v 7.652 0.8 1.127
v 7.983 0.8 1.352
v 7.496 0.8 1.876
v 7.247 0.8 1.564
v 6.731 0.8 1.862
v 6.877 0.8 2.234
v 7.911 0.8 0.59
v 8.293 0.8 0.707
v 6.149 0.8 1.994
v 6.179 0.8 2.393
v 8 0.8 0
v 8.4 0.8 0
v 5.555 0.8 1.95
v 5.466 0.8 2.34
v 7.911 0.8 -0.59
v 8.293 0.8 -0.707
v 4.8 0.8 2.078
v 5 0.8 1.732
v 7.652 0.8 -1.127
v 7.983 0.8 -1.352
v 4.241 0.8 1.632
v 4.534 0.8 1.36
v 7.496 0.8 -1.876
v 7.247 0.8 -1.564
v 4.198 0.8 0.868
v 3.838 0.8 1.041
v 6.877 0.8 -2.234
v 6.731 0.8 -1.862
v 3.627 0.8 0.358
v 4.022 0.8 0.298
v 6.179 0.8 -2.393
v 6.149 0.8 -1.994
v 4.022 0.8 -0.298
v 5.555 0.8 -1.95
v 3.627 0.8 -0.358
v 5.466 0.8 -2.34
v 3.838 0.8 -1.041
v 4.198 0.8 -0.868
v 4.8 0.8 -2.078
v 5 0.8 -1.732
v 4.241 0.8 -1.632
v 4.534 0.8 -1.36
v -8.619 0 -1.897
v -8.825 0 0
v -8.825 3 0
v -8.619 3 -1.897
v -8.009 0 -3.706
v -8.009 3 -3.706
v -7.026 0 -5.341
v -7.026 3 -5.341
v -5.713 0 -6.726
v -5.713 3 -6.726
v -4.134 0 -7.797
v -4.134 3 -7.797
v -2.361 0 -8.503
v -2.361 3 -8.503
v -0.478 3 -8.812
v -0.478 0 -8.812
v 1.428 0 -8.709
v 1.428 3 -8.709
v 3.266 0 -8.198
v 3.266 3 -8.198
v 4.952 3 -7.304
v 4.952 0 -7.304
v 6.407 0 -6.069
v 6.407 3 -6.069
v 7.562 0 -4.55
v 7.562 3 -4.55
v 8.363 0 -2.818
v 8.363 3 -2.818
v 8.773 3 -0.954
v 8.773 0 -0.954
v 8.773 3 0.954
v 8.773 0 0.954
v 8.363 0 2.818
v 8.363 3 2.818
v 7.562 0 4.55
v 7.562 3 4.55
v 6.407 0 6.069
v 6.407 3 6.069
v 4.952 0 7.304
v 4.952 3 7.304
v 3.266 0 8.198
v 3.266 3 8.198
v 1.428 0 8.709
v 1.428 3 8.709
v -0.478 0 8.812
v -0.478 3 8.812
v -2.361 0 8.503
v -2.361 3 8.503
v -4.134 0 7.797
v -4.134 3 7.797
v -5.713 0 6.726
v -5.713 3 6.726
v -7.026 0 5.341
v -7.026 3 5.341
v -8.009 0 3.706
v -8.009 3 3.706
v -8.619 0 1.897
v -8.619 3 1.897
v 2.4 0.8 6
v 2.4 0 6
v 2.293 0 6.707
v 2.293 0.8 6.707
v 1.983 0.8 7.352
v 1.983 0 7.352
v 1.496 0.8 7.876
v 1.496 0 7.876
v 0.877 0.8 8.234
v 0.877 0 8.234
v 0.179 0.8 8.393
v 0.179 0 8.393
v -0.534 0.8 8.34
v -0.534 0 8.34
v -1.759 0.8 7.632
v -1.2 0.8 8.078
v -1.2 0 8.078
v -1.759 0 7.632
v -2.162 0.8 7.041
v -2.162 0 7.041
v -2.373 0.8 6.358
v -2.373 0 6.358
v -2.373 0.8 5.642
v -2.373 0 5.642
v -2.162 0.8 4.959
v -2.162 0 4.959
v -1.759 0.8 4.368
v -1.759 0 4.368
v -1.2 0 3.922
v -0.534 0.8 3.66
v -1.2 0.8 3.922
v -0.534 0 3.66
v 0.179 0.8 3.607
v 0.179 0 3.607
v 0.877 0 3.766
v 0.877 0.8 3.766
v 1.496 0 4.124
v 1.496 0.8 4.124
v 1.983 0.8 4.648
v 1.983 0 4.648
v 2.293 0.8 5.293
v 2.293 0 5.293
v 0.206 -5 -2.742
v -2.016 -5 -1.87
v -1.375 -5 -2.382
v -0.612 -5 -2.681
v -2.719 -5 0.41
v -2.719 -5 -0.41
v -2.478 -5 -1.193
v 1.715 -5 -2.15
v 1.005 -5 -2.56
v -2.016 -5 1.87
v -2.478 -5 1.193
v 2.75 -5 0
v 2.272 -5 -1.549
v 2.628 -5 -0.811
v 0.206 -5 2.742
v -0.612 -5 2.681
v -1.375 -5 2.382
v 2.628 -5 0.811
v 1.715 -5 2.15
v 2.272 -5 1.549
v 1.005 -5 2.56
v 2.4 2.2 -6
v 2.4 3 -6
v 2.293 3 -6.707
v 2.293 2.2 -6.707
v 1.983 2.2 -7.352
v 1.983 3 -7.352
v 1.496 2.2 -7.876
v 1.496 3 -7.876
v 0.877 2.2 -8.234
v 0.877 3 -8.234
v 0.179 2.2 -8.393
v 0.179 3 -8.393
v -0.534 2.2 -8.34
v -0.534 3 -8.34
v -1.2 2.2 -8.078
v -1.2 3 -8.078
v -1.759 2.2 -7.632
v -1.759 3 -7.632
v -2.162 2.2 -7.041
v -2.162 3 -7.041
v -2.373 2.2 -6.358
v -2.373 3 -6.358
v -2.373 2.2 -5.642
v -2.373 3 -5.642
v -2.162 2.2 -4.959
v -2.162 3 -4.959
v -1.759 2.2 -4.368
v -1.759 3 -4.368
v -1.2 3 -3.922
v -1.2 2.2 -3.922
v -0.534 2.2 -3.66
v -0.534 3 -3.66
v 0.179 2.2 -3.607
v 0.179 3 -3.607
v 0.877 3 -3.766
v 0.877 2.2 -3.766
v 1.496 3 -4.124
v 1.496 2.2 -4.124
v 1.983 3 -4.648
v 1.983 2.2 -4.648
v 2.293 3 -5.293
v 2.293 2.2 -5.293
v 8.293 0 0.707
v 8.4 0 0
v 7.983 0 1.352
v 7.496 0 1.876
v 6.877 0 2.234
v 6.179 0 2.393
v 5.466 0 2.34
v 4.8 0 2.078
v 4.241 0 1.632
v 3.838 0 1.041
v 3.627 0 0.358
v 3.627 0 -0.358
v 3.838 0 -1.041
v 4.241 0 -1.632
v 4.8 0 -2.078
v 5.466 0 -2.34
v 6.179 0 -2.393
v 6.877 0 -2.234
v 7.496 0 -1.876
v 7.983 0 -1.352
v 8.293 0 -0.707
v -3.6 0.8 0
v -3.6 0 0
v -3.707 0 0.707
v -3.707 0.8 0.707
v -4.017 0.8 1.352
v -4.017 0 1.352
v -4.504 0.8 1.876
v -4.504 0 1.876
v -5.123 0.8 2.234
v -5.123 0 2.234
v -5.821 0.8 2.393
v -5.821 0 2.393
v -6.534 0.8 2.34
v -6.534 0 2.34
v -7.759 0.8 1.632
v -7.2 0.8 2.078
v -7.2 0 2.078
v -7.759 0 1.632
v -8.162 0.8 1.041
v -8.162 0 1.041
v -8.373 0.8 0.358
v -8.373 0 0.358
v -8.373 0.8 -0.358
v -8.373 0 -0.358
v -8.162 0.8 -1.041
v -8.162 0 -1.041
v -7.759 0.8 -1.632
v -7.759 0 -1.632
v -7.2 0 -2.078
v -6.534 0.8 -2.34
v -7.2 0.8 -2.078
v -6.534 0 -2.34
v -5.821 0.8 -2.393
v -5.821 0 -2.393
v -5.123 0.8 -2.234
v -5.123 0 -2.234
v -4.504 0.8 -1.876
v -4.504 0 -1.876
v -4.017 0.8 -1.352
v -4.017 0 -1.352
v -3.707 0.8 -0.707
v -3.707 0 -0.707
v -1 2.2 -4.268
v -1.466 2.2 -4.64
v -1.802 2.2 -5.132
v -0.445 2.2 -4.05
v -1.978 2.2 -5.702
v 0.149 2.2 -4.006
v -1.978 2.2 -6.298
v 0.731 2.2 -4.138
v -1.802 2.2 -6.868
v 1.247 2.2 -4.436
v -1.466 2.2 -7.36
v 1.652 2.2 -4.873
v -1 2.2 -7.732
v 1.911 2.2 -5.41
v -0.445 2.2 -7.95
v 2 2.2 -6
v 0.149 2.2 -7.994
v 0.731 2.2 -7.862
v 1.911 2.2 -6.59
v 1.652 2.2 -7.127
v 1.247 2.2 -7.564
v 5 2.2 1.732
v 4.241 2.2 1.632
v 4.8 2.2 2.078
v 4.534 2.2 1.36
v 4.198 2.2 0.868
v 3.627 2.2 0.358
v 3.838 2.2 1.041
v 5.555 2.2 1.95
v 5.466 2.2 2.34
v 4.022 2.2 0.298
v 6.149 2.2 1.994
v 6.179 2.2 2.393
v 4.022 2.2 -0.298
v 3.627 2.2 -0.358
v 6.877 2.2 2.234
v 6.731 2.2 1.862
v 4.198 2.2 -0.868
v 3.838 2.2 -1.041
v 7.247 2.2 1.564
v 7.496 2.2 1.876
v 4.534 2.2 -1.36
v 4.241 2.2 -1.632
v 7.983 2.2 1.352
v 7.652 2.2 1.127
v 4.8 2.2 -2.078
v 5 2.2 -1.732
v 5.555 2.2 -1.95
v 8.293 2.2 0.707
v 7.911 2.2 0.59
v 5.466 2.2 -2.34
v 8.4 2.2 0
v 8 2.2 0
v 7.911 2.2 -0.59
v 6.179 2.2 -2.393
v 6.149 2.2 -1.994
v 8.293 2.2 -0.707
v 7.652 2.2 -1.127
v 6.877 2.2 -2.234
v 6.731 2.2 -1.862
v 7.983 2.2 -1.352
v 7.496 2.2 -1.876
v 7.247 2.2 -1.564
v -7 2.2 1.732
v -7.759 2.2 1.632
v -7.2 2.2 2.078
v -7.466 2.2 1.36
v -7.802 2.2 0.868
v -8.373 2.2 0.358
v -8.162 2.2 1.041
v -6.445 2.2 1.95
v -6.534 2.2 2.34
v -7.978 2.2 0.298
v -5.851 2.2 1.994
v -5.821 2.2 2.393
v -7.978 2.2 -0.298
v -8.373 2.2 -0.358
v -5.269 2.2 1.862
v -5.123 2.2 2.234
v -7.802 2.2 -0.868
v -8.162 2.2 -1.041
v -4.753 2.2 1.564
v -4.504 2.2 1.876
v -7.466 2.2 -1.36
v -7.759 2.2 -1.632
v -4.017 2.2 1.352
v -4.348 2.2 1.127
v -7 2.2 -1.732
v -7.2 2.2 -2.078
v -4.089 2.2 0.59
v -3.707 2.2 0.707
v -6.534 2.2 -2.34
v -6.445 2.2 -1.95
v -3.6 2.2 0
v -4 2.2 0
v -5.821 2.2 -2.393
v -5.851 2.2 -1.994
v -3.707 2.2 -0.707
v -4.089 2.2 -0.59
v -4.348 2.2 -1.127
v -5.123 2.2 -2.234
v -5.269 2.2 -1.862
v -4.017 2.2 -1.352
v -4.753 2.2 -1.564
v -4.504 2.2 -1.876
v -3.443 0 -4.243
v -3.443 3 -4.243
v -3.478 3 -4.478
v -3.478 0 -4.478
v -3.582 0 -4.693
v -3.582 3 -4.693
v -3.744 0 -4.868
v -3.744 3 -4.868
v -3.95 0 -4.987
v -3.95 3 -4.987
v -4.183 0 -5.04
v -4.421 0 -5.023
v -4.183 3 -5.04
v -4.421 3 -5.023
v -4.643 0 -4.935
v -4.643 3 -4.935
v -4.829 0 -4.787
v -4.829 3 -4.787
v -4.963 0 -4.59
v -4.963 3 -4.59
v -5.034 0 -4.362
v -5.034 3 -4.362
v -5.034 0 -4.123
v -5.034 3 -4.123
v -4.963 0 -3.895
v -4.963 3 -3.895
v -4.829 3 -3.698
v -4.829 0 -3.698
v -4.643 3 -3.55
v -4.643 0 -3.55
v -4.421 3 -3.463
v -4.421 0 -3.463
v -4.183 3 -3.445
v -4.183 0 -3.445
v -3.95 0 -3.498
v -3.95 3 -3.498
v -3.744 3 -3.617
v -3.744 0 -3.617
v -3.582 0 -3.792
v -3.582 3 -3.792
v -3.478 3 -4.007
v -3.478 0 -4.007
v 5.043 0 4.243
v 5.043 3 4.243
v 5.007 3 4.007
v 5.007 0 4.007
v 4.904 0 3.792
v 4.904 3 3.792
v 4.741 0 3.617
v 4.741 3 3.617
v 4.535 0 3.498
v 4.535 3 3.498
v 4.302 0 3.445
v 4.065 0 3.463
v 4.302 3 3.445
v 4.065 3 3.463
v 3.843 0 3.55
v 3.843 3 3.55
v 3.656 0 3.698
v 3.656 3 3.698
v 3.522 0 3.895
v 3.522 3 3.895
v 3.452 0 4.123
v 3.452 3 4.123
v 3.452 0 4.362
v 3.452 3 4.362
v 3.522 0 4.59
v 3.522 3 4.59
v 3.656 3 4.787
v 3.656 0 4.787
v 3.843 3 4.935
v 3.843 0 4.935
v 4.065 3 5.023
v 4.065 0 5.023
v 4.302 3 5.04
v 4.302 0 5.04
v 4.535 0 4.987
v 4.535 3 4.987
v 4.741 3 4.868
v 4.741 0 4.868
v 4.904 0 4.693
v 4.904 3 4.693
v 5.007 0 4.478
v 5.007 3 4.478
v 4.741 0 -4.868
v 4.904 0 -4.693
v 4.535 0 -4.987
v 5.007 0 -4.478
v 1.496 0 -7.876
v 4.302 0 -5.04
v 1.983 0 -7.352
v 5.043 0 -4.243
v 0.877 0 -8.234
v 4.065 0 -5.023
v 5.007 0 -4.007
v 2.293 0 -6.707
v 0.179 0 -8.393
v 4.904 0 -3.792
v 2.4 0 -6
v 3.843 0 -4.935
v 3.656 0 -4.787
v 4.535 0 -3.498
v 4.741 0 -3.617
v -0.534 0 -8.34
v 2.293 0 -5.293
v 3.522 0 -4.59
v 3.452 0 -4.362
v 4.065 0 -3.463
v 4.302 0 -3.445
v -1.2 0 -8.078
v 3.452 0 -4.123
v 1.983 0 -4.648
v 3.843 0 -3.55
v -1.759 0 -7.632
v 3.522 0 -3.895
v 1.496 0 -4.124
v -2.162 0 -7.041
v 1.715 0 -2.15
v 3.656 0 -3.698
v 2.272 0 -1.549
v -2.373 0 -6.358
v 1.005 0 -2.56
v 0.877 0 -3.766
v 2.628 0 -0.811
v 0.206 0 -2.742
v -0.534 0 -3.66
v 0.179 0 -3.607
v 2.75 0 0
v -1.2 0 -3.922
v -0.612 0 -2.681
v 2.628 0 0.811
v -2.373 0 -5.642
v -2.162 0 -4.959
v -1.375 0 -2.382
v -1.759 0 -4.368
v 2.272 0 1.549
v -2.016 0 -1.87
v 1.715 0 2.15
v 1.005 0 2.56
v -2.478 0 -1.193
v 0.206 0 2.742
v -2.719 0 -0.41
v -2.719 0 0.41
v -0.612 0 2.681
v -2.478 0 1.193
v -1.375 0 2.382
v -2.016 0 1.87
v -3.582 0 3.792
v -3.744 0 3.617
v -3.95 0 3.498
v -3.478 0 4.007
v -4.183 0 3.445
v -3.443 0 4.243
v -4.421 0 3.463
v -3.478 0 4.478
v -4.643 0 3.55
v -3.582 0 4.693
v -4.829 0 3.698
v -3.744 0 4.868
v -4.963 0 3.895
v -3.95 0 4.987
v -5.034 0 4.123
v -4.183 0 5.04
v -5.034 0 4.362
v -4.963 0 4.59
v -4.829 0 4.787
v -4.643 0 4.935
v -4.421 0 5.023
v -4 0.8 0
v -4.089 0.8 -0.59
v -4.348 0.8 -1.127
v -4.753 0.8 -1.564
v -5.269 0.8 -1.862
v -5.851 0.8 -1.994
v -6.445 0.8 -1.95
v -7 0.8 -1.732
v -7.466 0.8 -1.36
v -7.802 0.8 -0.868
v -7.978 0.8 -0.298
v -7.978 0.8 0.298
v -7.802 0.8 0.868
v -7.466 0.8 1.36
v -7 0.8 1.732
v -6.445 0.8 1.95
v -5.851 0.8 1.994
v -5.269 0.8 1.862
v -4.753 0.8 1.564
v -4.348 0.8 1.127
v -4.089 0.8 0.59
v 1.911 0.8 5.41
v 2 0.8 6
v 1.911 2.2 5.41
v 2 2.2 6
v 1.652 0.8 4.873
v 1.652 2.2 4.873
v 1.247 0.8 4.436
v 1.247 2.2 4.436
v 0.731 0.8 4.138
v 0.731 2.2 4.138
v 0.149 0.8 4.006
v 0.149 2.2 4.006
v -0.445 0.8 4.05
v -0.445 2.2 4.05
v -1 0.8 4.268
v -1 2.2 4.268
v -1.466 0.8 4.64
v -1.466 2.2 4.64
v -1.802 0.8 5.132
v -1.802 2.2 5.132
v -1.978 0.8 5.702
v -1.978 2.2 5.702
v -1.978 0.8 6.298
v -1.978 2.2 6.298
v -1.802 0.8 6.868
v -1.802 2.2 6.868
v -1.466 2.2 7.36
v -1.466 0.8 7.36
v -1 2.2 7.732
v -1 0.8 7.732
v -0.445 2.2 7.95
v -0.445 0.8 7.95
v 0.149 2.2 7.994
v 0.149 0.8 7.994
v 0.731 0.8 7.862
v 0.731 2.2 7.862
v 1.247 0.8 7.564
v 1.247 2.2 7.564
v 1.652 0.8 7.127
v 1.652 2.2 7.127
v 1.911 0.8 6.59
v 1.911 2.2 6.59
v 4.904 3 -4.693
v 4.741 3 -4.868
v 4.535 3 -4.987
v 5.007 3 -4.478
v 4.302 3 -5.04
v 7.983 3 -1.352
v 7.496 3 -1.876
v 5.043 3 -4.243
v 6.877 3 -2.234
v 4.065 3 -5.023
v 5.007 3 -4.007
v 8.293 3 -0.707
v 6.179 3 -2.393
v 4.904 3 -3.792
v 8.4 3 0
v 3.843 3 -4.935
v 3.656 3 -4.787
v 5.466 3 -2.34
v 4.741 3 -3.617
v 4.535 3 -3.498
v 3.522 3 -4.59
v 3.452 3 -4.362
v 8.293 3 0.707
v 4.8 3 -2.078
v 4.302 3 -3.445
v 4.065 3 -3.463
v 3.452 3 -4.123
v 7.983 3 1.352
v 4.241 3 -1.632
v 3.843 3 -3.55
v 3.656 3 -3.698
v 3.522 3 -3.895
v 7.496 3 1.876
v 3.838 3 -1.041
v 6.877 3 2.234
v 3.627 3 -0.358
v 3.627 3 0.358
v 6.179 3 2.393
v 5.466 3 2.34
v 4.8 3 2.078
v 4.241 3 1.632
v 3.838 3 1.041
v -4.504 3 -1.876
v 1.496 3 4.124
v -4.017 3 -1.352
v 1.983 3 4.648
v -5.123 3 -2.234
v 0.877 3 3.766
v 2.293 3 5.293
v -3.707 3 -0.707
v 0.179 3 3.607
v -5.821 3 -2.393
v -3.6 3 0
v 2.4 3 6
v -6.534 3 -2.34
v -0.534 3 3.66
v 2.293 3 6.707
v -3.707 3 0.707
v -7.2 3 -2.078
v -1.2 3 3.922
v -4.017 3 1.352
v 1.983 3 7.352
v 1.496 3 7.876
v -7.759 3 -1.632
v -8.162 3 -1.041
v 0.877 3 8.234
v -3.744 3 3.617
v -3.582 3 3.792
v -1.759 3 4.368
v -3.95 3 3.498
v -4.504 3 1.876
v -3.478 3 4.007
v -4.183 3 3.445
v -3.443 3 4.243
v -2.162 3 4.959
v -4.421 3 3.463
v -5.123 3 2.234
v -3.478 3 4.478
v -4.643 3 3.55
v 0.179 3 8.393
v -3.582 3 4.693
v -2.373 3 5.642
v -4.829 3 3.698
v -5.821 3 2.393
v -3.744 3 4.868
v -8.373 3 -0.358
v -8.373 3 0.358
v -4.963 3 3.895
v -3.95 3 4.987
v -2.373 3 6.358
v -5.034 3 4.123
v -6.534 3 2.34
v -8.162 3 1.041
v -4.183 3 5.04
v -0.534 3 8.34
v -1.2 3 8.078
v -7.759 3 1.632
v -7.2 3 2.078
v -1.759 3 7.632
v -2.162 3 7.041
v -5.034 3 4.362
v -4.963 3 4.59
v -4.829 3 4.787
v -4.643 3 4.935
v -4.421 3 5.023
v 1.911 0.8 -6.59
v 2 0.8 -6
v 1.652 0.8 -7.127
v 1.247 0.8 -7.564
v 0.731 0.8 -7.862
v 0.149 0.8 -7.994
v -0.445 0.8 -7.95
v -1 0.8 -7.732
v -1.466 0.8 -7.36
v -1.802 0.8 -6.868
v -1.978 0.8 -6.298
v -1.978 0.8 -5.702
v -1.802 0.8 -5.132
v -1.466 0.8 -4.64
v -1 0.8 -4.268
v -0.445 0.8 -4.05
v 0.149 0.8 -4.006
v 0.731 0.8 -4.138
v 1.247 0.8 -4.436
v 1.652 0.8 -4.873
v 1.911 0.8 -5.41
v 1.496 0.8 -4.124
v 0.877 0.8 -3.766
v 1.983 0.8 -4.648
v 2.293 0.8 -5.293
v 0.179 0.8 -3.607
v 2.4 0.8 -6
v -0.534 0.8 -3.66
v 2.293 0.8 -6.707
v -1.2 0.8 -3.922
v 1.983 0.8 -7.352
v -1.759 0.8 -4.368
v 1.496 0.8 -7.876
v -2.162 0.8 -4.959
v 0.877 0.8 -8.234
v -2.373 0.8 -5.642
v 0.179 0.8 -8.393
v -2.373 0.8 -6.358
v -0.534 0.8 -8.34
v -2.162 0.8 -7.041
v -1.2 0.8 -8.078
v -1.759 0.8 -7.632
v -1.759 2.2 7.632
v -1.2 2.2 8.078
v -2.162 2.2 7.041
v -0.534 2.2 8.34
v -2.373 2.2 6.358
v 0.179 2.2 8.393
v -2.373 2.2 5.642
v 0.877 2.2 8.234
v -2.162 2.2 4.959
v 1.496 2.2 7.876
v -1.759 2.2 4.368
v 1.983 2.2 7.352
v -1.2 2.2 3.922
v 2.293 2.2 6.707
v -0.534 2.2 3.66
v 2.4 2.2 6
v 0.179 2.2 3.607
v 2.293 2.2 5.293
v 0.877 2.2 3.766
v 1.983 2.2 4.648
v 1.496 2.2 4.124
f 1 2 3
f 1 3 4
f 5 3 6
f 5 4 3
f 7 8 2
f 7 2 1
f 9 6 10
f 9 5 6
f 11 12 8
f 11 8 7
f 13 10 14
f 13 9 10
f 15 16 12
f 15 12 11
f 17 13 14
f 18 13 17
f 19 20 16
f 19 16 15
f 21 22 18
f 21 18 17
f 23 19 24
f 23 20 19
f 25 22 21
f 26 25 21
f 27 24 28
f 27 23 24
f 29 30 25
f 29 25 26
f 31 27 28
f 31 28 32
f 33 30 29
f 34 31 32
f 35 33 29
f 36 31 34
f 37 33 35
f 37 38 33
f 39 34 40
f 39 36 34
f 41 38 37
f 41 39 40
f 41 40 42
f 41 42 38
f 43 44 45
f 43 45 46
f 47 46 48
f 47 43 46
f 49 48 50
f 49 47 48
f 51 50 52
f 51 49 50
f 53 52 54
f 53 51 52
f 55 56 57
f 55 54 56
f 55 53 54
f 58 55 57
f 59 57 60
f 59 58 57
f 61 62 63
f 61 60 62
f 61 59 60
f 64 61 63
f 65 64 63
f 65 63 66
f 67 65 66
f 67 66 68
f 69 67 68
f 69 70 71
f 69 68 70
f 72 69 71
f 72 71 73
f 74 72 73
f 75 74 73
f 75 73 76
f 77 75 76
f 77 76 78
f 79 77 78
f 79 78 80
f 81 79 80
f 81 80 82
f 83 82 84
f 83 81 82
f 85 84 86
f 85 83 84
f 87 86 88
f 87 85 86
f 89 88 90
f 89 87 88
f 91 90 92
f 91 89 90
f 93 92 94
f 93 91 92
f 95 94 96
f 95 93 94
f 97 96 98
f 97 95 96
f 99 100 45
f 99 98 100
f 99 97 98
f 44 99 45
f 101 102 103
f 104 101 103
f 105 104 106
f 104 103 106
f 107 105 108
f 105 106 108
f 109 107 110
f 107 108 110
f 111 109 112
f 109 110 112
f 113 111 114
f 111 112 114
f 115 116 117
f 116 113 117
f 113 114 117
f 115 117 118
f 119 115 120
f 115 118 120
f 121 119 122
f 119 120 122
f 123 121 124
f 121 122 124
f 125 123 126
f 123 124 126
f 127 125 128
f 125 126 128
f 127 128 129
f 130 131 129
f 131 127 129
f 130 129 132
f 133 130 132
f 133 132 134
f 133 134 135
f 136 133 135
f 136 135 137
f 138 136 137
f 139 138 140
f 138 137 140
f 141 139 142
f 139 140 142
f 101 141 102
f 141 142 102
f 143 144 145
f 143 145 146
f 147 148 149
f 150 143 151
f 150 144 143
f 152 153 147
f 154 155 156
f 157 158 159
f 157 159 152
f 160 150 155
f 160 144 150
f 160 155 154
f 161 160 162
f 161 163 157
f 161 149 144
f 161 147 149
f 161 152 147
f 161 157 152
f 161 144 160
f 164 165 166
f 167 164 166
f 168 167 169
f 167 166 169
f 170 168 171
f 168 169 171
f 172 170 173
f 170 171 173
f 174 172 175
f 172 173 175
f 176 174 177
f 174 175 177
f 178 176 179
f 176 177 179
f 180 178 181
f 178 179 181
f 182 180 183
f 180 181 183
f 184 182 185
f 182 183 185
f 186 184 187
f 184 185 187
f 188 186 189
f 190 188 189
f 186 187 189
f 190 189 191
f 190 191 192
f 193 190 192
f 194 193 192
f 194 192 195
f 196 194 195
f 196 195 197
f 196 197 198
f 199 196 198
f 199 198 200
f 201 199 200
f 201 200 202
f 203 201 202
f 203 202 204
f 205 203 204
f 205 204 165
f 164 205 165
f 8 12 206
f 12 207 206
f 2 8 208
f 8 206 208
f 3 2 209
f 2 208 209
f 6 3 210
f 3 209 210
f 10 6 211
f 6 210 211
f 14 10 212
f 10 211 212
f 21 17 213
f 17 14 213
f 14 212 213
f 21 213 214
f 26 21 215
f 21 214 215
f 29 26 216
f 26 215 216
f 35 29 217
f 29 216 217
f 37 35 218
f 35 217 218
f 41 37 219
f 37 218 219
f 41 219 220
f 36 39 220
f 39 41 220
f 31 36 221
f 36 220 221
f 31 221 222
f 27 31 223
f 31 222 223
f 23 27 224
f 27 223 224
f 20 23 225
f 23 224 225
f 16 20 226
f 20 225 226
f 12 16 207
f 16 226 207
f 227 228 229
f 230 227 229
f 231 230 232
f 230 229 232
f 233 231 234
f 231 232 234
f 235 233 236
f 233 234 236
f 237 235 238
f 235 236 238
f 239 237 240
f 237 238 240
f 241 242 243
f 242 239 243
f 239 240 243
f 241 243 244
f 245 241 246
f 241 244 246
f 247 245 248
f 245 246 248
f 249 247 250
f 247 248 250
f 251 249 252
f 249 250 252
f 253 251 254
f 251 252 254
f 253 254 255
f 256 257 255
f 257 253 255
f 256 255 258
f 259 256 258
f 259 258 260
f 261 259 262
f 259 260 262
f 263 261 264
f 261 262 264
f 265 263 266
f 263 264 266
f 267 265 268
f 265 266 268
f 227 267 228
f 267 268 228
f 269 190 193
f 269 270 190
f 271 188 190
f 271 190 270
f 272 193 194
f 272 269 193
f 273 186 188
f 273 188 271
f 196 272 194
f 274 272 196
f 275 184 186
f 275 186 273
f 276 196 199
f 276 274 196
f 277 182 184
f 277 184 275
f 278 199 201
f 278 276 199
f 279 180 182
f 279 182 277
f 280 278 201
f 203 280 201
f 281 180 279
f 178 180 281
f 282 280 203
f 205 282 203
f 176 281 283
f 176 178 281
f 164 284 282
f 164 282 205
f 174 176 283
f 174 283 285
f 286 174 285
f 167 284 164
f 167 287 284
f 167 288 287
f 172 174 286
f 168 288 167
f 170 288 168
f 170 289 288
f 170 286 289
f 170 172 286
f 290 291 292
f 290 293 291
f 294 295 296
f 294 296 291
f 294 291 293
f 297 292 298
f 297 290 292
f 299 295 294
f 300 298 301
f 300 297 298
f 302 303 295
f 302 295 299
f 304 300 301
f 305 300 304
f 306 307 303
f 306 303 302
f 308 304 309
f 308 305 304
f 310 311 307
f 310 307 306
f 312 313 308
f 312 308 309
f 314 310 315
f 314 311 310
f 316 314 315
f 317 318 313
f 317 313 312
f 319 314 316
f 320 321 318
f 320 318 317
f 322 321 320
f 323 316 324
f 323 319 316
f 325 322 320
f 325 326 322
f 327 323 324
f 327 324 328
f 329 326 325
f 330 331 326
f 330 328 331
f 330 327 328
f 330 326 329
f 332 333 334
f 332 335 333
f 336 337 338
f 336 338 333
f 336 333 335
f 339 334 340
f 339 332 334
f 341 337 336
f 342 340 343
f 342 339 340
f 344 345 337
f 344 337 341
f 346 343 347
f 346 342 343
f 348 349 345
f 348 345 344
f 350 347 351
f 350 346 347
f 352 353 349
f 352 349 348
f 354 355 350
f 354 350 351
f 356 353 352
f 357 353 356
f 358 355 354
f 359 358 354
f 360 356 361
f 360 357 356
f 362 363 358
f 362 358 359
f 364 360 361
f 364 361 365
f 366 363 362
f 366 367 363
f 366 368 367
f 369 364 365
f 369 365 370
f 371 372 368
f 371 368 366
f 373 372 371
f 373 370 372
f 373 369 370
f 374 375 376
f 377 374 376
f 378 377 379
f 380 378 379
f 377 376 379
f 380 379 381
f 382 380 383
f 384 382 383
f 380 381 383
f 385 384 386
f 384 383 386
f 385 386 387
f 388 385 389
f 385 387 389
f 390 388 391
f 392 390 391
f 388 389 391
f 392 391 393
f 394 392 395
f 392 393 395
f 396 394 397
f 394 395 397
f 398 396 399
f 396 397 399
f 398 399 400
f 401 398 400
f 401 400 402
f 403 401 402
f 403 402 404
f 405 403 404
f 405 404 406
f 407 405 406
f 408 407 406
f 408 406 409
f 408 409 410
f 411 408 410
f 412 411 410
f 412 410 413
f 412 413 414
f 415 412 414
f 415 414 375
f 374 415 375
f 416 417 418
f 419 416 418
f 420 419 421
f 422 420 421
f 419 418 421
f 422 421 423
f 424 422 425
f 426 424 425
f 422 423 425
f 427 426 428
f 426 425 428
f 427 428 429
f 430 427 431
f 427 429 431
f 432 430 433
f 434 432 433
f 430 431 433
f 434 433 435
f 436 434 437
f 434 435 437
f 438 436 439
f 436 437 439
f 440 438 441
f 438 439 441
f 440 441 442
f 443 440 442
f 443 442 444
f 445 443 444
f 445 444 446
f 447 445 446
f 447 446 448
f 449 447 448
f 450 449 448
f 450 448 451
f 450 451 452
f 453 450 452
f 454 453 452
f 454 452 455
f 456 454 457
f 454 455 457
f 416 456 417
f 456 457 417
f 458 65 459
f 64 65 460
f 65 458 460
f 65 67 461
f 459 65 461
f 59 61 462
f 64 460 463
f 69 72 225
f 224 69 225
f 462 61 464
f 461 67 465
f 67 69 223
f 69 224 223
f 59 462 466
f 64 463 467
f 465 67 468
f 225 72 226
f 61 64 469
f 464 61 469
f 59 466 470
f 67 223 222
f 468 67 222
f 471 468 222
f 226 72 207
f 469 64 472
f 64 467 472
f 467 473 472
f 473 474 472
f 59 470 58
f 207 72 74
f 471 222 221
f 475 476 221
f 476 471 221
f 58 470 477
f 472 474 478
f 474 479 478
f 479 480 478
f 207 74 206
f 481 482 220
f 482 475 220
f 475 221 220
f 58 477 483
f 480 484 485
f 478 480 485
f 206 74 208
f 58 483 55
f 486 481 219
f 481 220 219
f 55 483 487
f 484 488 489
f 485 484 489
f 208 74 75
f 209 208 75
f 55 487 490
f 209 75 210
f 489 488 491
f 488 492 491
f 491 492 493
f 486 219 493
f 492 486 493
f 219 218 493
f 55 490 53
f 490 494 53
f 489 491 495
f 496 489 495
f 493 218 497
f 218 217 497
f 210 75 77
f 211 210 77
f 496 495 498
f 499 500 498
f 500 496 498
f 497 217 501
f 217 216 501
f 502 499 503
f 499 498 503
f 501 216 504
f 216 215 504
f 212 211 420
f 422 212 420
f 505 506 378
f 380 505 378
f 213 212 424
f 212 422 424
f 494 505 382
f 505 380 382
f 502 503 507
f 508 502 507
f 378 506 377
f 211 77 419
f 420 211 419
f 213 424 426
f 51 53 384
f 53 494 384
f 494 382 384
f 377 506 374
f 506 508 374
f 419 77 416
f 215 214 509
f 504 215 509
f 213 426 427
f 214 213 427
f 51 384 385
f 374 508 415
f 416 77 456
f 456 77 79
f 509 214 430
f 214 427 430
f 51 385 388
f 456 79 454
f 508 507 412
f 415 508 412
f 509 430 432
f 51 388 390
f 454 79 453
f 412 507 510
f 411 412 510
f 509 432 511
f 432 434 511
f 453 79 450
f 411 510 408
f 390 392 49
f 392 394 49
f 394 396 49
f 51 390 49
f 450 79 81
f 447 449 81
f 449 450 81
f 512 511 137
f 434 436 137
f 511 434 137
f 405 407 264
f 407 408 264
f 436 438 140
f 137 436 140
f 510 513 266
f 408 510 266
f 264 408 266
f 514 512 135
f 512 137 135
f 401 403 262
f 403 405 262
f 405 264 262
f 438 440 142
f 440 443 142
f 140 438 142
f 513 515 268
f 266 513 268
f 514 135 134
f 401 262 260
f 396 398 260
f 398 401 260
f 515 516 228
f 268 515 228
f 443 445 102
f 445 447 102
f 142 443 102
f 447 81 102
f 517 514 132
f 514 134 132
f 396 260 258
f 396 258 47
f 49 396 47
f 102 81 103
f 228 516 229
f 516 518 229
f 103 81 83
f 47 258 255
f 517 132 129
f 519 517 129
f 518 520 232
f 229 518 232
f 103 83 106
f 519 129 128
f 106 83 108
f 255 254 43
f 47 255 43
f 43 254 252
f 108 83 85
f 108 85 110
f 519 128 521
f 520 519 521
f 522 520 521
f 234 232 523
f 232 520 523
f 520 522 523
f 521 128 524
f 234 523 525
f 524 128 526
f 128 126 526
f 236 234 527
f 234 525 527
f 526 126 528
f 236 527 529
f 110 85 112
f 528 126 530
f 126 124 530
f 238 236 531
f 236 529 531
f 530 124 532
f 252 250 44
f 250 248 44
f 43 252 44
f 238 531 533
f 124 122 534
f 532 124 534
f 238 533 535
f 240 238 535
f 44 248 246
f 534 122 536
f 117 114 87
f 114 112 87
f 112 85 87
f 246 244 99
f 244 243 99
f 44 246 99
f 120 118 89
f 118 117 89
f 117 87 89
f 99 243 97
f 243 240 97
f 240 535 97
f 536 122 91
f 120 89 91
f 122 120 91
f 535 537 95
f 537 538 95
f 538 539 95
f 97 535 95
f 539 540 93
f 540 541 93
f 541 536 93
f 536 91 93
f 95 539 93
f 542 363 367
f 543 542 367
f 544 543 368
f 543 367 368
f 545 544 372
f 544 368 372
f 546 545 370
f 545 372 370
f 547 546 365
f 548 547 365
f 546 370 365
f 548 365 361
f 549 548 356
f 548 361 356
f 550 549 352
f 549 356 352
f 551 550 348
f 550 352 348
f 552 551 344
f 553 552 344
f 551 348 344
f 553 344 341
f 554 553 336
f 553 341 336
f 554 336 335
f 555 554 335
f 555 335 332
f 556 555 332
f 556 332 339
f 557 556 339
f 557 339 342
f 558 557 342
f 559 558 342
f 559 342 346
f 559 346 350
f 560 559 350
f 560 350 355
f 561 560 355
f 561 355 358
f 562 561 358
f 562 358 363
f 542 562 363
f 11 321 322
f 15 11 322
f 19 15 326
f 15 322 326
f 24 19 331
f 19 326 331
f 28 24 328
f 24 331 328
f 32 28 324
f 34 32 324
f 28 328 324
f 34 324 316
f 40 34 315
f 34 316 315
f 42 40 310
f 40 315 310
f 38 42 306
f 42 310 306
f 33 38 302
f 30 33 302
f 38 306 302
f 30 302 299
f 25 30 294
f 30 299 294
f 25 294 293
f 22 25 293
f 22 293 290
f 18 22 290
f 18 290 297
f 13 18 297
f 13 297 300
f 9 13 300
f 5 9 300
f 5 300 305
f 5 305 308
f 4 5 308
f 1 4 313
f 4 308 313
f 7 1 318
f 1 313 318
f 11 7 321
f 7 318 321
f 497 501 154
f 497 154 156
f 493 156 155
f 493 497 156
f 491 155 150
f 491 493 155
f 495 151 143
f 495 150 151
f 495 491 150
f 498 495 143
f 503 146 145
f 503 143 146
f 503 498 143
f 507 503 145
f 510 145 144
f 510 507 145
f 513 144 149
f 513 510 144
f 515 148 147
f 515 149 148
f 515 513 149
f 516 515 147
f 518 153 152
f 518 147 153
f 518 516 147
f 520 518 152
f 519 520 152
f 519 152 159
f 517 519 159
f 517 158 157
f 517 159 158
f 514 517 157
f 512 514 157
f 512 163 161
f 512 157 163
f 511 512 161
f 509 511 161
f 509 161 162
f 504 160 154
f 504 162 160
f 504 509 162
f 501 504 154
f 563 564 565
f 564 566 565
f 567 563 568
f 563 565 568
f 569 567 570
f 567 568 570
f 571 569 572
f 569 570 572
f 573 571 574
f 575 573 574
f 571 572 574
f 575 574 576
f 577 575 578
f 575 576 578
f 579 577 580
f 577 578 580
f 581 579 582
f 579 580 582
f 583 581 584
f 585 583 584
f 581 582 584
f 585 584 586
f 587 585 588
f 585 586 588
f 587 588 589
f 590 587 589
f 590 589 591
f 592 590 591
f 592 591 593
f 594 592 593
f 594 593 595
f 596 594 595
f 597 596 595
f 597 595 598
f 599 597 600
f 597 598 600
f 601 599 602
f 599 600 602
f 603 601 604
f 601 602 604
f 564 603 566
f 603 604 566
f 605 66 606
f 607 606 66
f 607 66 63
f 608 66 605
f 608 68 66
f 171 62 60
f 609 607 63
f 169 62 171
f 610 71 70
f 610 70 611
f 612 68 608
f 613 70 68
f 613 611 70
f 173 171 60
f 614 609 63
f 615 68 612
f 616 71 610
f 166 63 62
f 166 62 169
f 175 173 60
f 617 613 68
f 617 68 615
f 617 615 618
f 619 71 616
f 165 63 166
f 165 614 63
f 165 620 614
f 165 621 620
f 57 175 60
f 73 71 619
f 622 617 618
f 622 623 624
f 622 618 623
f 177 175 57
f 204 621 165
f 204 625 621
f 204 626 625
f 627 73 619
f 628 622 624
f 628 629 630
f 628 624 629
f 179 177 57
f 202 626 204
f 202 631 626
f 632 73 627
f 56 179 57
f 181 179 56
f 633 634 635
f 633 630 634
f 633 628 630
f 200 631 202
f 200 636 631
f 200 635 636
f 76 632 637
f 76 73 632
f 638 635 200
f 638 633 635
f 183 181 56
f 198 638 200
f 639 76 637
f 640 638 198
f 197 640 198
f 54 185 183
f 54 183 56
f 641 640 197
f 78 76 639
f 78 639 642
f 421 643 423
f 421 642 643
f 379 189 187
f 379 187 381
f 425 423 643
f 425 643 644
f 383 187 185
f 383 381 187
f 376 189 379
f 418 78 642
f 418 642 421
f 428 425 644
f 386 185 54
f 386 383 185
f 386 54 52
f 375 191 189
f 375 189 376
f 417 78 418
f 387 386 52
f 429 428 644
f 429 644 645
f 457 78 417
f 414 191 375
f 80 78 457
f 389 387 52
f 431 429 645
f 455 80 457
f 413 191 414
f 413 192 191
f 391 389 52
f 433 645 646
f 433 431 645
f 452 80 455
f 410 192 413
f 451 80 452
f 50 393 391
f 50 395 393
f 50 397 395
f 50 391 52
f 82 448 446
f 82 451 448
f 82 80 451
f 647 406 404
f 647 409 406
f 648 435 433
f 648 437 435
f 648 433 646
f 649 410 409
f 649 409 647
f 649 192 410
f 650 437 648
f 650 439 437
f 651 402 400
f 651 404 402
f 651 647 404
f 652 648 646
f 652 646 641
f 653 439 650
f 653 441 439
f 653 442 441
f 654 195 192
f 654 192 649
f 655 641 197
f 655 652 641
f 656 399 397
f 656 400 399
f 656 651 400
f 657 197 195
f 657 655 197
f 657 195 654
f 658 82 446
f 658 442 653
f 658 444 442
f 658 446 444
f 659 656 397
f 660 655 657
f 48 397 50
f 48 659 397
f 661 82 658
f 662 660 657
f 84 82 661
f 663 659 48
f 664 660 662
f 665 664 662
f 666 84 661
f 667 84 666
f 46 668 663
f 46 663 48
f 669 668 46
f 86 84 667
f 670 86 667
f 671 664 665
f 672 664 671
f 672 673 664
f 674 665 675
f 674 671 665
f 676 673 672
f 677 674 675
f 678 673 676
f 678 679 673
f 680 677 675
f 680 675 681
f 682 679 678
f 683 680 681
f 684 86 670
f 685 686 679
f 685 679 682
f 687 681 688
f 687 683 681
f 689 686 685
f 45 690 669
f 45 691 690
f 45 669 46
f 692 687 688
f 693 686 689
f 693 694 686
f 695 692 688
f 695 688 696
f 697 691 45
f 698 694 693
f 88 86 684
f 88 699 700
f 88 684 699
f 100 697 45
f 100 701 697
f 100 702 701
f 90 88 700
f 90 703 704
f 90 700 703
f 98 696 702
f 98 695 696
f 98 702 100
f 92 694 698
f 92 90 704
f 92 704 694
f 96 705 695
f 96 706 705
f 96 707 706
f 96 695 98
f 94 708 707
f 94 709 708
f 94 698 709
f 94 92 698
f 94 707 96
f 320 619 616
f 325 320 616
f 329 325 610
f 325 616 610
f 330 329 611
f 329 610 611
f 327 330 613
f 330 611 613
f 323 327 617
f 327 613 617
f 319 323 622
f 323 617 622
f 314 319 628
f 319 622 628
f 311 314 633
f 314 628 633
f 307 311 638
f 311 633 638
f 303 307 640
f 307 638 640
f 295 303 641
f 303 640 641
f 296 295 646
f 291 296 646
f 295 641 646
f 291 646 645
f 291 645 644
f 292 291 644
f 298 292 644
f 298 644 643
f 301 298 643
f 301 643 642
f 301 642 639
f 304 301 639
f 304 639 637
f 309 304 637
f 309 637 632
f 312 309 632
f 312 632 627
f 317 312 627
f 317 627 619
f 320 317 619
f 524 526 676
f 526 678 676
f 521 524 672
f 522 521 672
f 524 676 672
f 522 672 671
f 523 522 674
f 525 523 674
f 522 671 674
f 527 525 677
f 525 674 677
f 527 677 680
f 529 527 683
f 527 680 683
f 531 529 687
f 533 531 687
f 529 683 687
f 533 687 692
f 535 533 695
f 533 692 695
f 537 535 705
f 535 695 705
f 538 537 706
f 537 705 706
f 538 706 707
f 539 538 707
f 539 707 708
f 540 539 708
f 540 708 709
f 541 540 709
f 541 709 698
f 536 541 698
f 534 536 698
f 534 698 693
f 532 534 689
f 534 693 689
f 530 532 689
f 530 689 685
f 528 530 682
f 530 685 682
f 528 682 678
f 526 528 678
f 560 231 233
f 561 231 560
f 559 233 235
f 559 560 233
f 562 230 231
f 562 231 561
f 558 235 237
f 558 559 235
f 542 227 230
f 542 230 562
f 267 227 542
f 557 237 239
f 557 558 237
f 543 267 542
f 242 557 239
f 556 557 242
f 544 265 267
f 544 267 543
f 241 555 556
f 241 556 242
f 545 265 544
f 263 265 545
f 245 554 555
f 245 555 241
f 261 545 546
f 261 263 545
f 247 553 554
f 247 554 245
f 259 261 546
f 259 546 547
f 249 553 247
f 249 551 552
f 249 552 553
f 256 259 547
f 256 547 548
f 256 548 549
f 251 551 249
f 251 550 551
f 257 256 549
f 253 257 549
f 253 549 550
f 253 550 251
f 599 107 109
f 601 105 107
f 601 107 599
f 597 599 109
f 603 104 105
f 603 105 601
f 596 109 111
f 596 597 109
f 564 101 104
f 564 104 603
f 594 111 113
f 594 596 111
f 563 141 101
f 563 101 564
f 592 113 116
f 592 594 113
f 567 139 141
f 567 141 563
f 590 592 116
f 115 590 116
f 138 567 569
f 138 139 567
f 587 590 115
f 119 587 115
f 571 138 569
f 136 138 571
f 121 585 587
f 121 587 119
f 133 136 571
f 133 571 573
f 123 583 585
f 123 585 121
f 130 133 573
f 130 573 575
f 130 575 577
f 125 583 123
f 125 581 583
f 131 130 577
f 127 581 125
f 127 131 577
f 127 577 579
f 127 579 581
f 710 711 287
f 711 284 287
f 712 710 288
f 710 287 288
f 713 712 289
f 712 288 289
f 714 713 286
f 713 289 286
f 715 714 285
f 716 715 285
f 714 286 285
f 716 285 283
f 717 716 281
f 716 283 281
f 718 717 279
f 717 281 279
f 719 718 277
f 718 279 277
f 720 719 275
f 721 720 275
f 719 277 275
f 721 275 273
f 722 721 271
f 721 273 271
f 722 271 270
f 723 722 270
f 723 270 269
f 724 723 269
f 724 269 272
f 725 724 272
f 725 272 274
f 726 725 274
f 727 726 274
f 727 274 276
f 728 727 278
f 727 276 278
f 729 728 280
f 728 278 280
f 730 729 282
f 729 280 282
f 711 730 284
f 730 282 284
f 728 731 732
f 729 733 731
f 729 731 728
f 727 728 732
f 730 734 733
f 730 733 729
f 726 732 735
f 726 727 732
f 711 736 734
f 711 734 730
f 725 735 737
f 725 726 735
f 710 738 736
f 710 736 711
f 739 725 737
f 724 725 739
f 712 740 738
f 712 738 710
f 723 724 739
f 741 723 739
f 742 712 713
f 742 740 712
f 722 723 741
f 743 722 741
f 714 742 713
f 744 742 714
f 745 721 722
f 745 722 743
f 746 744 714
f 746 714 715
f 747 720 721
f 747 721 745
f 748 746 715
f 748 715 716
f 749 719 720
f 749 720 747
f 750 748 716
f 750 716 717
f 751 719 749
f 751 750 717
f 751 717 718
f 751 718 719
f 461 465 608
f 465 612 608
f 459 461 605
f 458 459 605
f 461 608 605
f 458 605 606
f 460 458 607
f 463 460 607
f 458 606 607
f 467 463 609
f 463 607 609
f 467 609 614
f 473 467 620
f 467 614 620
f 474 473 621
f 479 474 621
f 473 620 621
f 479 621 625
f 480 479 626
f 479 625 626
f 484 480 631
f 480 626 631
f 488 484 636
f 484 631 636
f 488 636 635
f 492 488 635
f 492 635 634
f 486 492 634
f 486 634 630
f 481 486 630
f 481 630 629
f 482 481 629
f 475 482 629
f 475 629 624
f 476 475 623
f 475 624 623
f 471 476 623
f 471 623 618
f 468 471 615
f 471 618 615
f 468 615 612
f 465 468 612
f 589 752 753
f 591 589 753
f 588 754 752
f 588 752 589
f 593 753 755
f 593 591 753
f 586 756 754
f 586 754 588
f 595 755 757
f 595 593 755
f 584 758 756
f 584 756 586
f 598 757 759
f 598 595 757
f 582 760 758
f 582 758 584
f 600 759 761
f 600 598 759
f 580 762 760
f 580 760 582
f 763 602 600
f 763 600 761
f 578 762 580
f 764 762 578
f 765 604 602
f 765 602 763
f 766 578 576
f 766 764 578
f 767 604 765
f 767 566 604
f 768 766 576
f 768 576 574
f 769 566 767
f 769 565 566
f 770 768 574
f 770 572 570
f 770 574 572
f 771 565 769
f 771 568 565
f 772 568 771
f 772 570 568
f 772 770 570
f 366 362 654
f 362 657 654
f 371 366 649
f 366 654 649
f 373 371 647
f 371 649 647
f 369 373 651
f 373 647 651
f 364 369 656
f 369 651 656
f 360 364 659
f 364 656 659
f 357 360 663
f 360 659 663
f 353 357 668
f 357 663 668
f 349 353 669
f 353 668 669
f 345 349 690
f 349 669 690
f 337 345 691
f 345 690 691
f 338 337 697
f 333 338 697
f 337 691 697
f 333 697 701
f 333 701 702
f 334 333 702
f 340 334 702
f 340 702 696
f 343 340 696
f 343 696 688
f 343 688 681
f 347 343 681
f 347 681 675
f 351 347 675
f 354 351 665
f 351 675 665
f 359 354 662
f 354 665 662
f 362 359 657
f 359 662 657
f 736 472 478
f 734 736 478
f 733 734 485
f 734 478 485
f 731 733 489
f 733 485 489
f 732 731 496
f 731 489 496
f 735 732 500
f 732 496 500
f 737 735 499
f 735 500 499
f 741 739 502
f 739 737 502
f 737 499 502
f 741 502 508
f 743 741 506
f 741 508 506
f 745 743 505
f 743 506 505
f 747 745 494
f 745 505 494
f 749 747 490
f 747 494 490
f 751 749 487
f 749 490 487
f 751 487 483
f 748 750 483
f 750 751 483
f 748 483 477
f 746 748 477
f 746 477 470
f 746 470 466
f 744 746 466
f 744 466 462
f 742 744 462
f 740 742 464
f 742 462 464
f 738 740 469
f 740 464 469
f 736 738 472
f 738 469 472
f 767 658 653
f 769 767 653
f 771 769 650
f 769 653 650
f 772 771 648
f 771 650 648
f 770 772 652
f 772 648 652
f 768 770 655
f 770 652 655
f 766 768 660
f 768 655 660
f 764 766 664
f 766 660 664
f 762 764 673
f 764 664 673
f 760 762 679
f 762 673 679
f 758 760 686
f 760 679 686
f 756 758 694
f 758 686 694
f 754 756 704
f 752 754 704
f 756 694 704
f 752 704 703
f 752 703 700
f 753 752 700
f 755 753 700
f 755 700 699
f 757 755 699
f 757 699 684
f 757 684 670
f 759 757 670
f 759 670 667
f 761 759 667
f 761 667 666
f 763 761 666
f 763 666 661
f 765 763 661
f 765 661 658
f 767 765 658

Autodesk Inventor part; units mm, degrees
ref_plane "YZ Plane" through (0, 0, 0) normal (1, 0, 0) x (0, 1, 0)
ref_plane "XZ Plane" through (0, 0, 0) normal (0, 1, 0) x (-1, 0, 0)
sketch "Sketch1" plane through (0, 0, 0) normal (0, 1, 0) x (-1, 0, 0)
  circle A0 centre (0, 0) radius 8.825
  dimension "d0" = 17.65
extrude "Extrusion1" add sketch "Sketch1" along normal blind 3
sketch "Sketch2" plane through (0, 0, 0) normal (0, -1, 0) x (1, 0, 0)
  circle A0 centre (0, 0) radius 8.825 projected
  circle A1 centre (0, 0) radius 2.75
  dimension "d3" = 5.5
extrude "Extrusion2" add sketch "Sketch2" along normal blind 5 contours A1
sketch "Sketch3" plane through (0, 3, 0) normal (0, 1, 0) x (1, 0, 0)
  circle A0 centre (0, 0) radius 8.825 projected
  circle A1 centre (-6, 0) radius 2
  line L0 (-6, 0) -> (5.0545, 0) construction
  circle A2 centre (0, -6) radius 2
  circle A3 centre (6, 0) radius 2
  circle A4 centre (0, 6) radius 2
  circle A5 centre (-4.2426, 4.2426) radius 0.8
  line L1 (0, 0) -> (-4.2426, 4.2426) construction
  circle A6 centre (0, 0) radius 2.75 projected
  arc A7 (0, 6) -> (-6, 0) centre (0, 0) ccw construction
  circle A8 centre (-4.2426, -4.2426) radius 0.8
  circle A9 centre (4.2426, -4.2426) radius 0.8
  circle A10 centre (4.2426, 4.2426) radius 0.8
  dimension "d6" = 4
  dimension "d7" = 6
  dimension "d10" = 360
  dimension "d14" = 1.6
  dimension "d15" = 45
  dimension "d18" = 360
extrude "Extrusion3" cut sketch "Sketch3" against normal through all contours A1 | A2 | A3 | A4 | A5 | A8 | A9 | A10
sketch "Sketch4" plane through (0, 3, 0) normal (0, 1, 0) x (1, 0, 0)
  circle A0 centre (6, 0) radius 2 projected
  circle A1 centre (-6, 0) radius 2 projected
  circle A2 centre (0, -6) radius 2 projected
  circle A3 centre (0, 6) radius 2 projected
  circle A4 centre (0, 6) radius 2.4
  circle A5 centre (-6, 0) radius 2.4
  circle A6 centre (6, 0) radius 2.4
  circle A7 centre (0, -6) radius 2.4
  dimension "d20" = 0.4
  dimension "d21" = 0.4
  dimension "d22" = 0.4
  dimension "d23" = 0.4
extrude "Extrusion4" cut sketch "Sketch4" against normal blind 0.8
ref_plane "Work Plane1" through (0, 1.5, 0) normal (0, 1, 0) x (1, 0, 0)
mirror "Mirror1" about plane through (0, 1.5, 0) normal (0, 1, 0) of "Extrusion4"
properties part number "xl320_wheel" material "PC/ABS Plastic"
